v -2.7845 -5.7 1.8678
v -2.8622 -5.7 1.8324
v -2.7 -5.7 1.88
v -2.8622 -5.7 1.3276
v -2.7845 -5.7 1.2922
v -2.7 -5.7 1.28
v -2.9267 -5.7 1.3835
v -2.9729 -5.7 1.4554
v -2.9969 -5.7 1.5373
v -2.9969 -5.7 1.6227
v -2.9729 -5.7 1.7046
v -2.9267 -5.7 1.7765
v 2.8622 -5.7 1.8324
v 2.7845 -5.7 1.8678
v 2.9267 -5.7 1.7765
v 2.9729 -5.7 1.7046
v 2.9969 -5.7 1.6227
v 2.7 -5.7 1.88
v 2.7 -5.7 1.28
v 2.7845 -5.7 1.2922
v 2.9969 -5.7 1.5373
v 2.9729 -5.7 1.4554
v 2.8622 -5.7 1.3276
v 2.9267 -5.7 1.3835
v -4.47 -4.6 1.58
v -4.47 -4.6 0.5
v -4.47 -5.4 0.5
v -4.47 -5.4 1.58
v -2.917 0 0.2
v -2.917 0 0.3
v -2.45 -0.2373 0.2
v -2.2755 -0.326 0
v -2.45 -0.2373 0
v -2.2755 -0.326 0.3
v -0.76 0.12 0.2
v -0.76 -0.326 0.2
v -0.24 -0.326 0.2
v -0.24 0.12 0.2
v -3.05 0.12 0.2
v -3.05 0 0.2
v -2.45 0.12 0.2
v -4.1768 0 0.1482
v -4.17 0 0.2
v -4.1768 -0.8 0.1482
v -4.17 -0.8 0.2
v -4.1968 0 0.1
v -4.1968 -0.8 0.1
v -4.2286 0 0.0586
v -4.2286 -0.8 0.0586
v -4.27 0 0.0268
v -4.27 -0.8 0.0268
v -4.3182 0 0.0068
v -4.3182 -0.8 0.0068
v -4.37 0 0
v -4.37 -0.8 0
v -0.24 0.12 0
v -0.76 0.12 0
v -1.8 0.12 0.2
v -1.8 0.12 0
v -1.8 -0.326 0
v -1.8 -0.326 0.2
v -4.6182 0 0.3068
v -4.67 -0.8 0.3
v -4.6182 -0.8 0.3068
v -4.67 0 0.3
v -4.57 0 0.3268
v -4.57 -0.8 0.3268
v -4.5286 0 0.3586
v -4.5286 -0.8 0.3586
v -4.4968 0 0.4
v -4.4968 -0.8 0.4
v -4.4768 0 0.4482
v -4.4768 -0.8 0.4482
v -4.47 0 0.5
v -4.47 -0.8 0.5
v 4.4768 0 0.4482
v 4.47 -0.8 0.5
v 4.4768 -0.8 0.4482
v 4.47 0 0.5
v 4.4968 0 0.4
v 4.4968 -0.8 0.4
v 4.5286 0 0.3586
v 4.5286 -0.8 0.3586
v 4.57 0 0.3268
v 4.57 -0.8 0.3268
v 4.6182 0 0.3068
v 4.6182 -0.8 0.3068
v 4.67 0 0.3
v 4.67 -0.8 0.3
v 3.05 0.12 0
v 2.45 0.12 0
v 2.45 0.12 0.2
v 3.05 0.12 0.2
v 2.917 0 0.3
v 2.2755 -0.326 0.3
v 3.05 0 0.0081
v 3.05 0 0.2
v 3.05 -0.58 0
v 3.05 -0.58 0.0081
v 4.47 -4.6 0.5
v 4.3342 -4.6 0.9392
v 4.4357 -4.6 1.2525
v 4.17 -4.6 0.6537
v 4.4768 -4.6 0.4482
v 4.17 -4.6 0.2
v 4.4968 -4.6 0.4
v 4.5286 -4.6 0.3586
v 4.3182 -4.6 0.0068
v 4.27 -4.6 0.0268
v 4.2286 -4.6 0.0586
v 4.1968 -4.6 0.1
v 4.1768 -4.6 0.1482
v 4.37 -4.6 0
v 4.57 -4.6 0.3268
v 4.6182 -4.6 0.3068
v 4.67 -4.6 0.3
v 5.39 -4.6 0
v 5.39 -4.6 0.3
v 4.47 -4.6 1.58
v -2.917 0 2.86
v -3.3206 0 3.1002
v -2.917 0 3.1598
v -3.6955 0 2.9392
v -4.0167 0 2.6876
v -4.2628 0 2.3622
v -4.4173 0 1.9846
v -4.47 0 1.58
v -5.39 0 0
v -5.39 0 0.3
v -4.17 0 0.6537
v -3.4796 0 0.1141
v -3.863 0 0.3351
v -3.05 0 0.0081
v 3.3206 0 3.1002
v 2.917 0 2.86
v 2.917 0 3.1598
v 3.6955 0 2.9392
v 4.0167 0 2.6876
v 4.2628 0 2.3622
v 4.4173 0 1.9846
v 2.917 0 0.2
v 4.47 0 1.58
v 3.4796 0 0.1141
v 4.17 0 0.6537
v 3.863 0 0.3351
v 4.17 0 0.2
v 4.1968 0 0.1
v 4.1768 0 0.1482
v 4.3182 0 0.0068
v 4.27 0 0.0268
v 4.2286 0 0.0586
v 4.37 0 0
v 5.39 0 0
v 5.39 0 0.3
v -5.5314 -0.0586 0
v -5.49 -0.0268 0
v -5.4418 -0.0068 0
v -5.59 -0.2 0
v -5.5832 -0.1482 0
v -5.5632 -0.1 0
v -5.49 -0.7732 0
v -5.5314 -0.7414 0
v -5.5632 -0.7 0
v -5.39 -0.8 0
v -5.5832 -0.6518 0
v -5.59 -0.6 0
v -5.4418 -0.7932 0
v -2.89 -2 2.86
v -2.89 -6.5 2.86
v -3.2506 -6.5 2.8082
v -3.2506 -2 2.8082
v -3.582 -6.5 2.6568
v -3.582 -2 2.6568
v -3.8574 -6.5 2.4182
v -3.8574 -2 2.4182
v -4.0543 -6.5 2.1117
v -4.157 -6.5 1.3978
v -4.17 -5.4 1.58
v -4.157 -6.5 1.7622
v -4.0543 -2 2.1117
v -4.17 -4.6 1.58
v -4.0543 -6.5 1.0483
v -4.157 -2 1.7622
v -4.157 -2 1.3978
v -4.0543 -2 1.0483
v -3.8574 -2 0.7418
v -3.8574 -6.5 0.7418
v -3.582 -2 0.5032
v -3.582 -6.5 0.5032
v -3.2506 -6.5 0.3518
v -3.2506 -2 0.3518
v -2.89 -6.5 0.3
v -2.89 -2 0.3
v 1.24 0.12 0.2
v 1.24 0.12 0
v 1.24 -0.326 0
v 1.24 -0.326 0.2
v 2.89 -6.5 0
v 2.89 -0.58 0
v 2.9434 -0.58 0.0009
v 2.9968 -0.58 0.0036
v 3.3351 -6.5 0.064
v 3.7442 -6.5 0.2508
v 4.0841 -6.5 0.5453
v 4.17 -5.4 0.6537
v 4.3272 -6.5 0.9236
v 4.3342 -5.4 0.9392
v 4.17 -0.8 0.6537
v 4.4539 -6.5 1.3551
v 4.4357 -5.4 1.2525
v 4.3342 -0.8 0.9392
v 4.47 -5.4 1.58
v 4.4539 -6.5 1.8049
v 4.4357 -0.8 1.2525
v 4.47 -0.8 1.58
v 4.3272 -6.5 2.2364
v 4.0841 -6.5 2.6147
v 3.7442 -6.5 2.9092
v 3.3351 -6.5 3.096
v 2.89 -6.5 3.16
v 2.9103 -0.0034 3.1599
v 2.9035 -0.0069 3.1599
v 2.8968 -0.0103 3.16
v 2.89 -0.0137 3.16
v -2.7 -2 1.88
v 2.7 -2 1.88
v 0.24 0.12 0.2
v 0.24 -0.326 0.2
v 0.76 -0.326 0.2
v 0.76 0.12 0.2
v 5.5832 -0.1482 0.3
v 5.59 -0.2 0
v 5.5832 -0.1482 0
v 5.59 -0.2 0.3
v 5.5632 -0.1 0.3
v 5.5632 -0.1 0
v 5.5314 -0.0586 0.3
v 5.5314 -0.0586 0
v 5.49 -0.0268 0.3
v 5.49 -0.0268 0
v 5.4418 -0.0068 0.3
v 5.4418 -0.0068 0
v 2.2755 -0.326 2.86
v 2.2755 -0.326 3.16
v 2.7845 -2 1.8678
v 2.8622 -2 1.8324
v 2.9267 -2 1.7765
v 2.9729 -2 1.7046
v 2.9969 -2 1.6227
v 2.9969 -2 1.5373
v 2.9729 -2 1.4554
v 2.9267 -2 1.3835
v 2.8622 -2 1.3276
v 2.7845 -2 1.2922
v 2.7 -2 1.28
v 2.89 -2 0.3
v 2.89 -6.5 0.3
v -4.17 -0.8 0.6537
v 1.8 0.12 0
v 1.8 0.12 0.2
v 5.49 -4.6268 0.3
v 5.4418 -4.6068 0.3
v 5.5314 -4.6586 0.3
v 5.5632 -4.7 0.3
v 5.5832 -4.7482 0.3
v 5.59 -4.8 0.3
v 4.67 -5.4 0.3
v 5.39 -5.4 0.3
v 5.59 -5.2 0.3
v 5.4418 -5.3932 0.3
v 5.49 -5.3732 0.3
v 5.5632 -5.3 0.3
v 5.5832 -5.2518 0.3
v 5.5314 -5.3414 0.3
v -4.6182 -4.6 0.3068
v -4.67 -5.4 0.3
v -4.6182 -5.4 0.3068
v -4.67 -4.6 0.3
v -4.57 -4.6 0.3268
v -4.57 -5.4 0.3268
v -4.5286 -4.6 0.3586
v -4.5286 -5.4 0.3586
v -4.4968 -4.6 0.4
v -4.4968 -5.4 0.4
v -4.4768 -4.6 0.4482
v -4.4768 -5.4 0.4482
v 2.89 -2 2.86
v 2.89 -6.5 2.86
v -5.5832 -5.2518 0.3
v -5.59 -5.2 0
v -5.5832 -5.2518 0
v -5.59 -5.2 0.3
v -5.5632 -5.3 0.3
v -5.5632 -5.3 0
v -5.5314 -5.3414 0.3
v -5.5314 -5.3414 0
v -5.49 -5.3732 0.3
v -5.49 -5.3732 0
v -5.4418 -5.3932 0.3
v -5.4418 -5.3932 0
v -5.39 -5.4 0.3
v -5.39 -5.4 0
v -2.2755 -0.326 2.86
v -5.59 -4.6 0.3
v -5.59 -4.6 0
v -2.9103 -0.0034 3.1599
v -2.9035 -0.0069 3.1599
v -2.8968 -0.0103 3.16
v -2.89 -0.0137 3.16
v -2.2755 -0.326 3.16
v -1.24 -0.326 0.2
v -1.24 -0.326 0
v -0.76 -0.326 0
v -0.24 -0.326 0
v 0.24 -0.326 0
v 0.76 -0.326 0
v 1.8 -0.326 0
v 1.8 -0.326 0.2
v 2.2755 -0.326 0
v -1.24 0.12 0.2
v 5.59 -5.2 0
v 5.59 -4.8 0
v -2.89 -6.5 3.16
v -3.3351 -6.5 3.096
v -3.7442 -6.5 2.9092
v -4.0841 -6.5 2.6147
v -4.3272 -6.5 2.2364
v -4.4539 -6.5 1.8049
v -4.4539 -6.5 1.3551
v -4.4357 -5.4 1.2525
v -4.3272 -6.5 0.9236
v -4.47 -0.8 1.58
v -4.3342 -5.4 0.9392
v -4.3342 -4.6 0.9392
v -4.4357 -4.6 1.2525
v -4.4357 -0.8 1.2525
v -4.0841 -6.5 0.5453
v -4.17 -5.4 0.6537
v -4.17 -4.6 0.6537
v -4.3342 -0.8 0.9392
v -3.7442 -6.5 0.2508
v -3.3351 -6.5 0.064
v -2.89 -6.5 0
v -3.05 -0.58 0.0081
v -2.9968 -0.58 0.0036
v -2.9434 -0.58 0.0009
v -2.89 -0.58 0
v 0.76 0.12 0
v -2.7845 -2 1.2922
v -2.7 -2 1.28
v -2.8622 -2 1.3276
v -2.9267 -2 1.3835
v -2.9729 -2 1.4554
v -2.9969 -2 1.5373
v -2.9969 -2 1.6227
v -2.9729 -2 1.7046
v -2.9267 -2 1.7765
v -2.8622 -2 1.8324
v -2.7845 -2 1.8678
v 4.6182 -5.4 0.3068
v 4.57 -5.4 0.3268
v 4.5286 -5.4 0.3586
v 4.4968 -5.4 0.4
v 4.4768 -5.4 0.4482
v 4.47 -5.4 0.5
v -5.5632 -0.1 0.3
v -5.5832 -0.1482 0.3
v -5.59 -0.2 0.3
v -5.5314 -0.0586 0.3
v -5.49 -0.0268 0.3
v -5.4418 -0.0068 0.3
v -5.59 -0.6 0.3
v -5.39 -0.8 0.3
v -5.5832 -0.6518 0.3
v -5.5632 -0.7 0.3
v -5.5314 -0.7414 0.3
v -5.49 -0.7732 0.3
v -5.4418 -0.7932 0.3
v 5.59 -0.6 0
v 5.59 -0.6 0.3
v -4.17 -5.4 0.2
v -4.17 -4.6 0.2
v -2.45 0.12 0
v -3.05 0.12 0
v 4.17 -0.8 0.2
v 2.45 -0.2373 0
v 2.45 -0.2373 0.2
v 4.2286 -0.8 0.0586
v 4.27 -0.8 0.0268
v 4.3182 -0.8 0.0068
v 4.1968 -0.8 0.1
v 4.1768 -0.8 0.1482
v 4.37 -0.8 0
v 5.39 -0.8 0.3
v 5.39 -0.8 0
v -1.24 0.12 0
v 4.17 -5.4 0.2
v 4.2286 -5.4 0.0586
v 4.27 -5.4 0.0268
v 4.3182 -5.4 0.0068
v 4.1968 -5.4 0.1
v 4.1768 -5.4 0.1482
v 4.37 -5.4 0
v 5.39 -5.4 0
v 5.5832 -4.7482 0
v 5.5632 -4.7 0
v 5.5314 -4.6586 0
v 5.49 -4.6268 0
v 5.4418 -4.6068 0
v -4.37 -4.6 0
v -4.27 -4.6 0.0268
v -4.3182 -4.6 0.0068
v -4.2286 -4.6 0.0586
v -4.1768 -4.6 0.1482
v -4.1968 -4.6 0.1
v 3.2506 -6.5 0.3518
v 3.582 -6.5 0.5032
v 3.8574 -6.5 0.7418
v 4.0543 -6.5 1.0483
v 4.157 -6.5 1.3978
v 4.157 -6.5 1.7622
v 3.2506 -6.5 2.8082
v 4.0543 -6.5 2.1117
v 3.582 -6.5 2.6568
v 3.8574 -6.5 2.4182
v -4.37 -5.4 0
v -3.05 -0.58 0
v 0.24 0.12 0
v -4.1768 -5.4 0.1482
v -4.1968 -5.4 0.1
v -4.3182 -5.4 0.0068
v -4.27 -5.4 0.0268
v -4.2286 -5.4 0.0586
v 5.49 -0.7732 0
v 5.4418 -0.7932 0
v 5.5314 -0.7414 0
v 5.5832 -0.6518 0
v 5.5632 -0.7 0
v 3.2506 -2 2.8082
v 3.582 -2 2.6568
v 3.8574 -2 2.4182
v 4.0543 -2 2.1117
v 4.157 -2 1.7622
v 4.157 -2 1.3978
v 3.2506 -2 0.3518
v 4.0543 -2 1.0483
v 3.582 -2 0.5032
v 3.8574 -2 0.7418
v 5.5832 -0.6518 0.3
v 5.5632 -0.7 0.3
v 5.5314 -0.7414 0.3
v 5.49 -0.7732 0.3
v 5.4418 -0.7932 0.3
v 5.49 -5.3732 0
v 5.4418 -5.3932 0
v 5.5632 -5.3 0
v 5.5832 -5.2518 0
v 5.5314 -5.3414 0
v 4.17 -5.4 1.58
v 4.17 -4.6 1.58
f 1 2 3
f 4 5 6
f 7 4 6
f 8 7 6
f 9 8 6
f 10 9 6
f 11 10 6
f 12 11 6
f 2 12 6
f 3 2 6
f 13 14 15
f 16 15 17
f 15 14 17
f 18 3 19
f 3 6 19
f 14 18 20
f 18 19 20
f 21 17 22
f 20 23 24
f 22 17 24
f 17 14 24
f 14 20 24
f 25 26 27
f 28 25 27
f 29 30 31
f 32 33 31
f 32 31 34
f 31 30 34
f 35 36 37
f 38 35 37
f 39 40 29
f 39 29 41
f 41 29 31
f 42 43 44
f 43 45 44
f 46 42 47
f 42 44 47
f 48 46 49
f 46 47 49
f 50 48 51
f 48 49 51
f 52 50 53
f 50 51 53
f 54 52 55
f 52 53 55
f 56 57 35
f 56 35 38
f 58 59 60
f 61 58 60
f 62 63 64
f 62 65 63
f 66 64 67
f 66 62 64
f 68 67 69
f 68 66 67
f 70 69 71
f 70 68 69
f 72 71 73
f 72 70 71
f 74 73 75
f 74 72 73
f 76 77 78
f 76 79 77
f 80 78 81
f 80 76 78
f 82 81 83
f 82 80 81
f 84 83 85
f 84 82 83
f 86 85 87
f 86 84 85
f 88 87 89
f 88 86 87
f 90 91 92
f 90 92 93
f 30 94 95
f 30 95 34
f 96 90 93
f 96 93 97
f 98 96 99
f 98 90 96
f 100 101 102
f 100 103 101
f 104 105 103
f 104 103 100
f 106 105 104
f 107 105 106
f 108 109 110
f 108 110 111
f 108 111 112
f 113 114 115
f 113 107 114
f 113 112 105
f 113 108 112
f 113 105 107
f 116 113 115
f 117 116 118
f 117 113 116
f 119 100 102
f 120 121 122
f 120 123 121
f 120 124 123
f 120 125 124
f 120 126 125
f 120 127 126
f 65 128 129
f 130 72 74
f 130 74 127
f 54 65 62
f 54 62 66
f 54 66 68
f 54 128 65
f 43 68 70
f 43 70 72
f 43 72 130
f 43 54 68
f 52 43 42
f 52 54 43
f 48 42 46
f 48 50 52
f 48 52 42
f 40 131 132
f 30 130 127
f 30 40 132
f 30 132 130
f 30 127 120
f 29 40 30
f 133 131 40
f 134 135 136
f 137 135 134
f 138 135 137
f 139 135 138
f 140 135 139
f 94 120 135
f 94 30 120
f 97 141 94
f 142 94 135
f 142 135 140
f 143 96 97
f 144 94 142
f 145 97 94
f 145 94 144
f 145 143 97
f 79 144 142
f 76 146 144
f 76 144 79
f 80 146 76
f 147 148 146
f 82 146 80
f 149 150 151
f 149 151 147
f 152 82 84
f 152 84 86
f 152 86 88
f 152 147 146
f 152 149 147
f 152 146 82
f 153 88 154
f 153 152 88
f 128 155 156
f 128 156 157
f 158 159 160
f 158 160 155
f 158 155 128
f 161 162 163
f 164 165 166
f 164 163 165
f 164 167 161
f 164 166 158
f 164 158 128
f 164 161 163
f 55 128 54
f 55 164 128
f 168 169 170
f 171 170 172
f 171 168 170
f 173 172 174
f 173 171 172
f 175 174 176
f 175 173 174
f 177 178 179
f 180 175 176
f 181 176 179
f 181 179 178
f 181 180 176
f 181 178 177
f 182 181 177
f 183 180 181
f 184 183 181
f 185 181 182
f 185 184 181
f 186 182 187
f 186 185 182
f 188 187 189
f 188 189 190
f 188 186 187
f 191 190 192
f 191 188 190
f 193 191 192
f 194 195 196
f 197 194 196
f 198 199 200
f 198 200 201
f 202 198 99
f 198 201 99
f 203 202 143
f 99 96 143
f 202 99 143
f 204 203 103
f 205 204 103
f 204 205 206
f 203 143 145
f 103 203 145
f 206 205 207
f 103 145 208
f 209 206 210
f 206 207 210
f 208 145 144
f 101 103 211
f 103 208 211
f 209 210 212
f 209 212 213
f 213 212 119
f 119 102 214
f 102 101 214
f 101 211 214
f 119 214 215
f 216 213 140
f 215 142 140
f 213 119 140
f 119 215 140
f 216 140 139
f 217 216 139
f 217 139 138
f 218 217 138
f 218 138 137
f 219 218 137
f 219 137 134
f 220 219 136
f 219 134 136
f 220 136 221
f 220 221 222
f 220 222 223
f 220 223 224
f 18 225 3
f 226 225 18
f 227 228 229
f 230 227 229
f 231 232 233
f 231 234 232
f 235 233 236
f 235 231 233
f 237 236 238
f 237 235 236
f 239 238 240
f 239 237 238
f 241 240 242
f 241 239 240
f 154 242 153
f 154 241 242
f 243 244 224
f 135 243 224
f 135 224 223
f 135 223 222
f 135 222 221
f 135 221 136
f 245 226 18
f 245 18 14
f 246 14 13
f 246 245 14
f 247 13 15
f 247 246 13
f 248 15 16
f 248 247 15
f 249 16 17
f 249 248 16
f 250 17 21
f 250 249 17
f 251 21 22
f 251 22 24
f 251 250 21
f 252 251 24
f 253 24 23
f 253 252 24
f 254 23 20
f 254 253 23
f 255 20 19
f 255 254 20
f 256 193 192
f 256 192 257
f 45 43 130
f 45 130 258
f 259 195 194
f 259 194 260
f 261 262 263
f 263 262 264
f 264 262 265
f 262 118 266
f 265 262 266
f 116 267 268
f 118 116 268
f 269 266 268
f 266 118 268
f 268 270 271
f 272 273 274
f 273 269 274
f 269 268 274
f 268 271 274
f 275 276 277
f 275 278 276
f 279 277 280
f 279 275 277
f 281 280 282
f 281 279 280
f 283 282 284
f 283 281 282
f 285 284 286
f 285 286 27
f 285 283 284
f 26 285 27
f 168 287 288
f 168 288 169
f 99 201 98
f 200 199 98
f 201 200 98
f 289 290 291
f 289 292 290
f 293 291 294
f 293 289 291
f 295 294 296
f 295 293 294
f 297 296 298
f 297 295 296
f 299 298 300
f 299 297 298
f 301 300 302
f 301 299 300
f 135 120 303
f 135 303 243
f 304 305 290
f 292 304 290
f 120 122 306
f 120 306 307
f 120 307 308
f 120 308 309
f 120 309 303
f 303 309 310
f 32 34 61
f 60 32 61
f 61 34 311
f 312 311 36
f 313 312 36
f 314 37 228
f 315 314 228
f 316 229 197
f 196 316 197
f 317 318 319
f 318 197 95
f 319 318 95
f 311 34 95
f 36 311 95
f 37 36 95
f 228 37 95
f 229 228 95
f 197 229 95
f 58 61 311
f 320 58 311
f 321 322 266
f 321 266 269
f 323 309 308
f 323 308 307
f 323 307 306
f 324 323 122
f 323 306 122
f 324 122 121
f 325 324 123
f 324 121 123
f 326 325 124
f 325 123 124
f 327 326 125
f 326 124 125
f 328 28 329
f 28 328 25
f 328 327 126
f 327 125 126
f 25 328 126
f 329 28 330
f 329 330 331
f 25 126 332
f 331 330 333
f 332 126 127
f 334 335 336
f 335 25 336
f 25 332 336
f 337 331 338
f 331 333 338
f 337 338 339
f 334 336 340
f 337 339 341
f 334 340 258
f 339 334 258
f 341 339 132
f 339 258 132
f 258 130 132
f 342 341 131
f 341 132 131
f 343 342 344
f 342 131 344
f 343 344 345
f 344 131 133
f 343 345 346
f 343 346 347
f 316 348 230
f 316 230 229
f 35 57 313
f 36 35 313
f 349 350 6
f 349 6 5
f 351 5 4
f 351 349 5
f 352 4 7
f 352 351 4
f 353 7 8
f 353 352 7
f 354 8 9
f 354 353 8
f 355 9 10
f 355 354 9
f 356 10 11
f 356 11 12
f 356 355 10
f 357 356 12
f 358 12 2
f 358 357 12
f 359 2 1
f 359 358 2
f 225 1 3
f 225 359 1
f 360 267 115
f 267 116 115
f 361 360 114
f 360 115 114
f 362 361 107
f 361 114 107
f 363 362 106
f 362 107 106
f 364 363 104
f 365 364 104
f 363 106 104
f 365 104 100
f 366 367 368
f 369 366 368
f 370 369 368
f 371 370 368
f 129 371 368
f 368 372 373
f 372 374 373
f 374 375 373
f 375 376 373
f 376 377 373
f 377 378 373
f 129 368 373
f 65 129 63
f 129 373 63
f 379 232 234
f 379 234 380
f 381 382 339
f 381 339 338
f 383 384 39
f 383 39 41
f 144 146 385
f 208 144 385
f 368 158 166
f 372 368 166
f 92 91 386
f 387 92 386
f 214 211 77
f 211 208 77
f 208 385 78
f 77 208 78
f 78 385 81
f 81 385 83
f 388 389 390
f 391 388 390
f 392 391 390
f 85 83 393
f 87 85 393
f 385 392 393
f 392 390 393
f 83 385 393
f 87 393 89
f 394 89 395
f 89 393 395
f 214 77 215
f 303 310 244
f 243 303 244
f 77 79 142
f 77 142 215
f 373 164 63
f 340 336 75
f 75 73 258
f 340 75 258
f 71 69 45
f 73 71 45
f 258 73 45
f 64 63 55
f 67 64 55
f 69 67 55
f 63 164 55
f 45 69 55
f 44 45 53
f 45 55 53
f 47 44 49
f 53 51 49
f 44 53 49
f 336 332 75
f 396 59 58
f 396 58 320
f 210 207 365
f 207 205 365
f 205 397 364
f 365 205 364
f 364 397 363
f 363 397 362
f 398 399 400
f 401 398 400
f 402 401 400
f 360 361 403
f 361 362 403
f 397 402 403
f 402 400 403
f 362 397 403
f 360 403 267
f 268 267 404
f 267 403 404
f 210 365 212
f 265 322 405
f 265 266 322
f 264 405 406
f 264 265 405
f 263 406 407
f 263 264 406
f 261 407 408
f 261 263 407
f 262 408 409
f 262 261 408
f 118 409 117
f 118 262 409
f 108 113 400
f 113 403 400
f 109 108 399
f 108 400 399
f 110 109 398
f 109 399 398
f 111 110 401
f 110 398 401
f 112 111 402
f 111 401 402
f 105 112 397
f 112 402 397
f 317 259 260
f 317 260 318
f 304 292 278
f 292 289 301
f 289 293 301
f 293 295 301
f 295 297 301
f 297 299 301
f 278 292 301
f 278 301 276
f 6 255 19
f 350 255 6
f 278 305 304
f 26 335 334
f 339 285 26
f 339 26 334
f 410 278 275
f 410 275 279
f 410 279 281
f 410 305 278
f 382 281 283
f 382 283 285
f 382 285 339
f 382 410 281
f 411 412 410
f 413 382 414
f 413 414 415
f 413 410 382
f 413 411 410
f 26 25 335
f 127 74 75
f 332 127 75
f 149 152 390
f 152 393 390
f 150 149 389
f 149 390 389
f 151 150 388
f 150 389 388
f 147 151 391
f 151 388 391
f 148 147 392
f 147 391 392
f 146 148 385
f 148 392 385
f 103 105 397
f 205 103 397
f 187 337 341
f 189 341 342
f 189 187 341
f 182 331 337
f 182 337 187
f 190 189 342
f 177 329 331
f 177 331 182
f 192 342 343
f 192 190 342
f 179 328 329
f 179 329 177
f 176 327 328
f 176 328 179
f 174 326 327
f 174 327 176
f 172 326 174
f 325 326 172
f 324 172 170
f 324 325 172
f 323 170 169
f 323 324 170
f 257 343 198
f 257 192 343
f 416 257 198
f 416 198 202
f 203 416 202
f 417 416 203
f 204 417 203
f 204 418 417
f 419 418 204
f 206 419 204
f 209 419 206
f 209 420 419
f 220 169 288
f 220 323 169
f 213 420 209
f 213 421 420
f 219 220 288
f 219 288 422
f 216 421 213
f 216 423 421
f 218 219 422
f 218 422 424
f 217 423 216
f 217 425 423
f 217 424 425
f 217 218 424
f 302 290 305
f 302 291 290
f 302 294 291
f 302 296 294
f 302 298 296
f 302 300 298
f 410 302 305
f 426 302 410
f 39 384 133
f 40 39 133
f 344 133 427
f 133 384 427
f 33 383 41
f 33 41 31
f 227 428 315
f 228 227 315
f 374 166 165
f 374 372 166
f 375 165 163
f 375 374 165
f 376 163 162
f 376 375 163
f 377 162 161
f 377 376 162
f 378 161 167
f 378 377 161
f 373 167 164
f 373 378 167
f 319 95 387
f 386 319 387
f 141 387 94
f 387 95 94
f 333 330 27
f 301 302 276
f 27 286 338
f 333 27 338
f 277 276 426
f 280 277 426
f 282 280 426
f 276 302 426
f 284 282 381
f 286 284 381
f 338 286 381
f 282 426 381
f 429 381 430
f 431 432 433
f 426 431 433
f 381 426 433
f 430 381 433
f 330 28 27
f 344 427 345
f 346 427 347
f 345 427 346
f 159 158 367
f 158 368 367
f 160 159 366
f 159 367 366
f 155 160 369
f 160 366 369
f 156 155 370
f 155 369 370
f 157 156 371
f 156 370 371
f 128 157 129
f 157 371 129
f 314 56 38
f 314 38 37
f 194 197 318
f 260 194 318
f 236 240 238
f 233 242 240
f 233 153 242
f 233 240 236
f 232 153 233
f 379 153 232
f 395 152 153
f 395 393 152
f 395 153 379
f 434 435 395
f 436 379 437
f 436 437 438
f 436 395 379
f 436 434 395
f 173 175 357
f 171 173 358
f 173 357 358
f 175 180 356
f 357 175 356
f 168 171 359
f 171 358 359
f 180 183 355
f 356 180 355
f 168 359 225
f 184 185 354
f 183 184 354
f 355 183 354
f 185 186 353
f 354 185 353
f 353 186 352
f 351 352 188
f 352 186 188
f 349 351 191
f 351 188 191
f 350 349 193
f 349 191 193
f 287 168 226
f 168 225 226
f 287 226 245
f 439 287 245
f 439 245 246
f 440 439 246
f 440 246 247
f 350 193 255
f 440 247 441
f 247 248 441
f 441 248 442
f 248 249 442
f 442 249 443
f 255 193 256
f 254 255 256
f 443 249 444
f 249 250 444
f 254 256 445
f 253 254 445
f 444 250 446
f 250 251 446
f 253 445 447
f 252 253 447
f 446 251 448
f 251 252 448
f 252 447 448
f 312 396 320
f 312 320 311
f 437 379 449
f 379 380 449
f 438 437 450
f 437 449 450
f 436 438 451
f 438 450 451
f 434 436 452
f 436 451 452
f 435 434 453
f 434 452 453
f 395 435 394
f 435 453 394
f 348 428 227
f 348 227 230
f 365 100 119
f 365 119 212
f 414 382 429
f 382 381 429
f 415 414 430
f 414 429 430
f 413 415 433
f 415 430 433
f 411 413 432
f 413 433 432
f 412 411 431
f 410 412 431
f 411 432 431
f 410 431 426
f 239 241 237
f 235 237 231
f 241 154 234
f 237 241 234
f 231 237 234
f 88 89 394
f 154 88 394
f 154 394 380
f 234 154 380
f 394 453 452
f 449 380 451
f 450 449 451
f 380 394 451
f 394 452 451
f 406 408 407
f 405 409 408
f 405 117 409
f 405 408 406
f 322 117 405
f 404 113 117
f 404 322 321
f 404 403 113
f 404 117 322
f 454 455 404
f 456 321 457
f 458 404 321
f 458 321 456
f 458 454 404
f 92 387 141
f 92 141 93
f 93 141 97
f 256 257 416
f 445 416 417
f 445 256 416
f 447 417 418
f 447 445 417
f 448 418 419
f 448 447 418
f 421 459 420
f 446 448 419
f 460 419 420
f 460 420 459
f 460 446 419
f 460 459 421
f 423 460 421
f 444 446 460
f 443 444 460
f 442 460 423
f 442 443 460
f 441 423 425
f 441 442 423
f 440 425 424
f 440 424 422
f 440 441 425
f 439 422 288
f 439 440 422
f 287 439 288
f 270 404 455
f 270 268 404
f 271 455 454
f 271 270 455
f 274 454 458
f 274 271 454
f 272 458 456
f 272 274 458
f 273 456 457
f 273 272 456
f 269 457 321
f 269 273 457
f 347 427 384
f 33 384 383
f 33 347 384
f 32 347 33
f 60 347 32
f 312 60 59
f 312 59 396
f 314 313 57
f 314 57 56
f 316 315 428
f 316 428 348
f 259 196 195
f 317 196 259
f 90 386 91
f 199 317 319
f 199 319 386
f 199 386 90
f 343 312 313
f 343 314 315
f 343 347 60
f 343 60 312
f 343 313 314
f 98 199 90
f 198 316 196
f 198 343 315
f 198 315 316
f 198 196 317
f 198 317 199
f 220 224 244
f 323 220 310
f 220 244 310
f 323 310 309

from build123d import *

# Parameters (mm, degrees)
PAD_DEPTH     = 6.5
POCKET_DEPTH  = 3.161
SKETCH002_W   = 0.3
SKETCH002_H   = 0.8
PAD001_DEPTH  = 1.58
SKETCH007_W   = 0.6
SKETCH007_H   = 0.7
SKETCH007_W_2 = 0.56
SKETCH007_W_3 = 0.52
PAD002_DEPTH  = 0.2
PAD003_DEPTH  = 2
PAD004_DEPTH  = 5.7
SKETCH008_W   = 1.42
SKETCH008_H   = 0.8
PAD005_DEPTH  = 0.3
FILLET_R      = 0.2


with BuildPart() as part:
    # Sketch → Pad (new body)
    with BuildSketch(Plane.XZ):
        with BuildLine():
            ThreePointArc((-2.89, 3.16), (-4.47, 1.58), (-2.89, 0))
            Line((-2.89, 0), (2.89, 0))
            ThreePointArc((2.89, 0), (4.47, 1.58), (2.89, 3.16))
            Line((2.89, 3.16), (-2.89, 3.16))
        make_face()
        with BuildLine():
            ThreePointArc((-2.89, 2.86), (-4.17, 1.58), (-2.89, 0.3))
            Line((-2.89, 0.3), (2.89, 0.3))
            ThreePointArc((2.89, 0.3), (4.17, 1.58), (2.89, 2.86))
            Line((2.89, 2.86), (-2.89, 2.86))
        make_face(mode=Mode.SUBTRACT)
    extrude(amount=PAD_DEPTH)

    # Sketch001 (on DatumPlane) → Pocket (cut, through all)
    with BuildSketch(Plane(origin=(0, 0, 3.16), x_dir=(-1, 0, 0), z_dir=(0, 0, 1))):
        Polygon((-2.917, 0), (2.917, 0), (2.275486, 0.326), (-2.275486, 0.326), align=None)
    extrude(amount=-POCKET_DEPTH, mode=Mode.SUBTRACT)

    # Sketch002 (on DatumPlane) → Pad001 (join)
    with BuildSketch(Plane(origin=(0, 0, 0), x_dir=(1, 0, 0), z_dir=(0, 0, -1))):
        with Locations((-4.32, 5)):
            Rectangle(SKETCH002_W, SKETCH002_H)
        with Locations((4.32, 5)):
            Rectangle(SKETCH002_W, SKETCH002_H)
        with Locations((-4.32, 0.4)):
            Rectangle(SKETCH002_W, SKETCH002_H)
        with Locations((4.32, 0.4)):
            Rectangle(SKETCH002_W, SKETCH002_H)
    extrude(amount=-PAD001_DEPTH)

    # Sketch007 → Pad002 (join)
    with BuildSketch(Plane(origin=(0, 0, 0), x_dir=(1, 0, 0), z_dir=(0, 0, -1))):
        with Locations((-2.75, 0.23)):
            Rectangle(SKETCH007_W, SKETCH007_H)
        with Locations((-1.52, 0.23)):
            Rectangle(SKETCH007_W_2, SKETCH007_H)
        with Locations((-0.5, 0.23)):
            Rectangle(SKETCH007_W_3, SKETCH007_H)
        with Locations((2.75, 0.23)):
            Rectangle(SKETCH007_W, SKETCH007_H)
        with Locations((1.52, 0.23)):
            Rectangle(SKETCH007_W_2, SKETCH007_H)
        with Locations((0.5, 0.23)):
            Rectangle(SKETCH007_W_3, SKETCH007_H)
    extrude(amount=-PAD002_DEPTH)

    # Sketch005 (on DatumPlane) → Pad003 (join)
    with BuildSketch(Plane(origin=(0, 0, 0), x_dir=(1, 0, 0), z_dir=(0, 1, 0))):
        with BuildLine():
            ThreePointArc((-2.95, -0.3), (-4.23, -1.58), (-2.95, -2.86))
            Line((-2.95, -2.86), (2.95, -2.86))
            ThreePointArc((2.95, -2.86), (4.23, -1.58), (2.95, -0.3))
            Line((2.95, -0.3), (-2.95, -0.3))
        make_face()
    extrude(amount=-PAD003_DEPTH)

    # Sketch006 (on DatumPlane) → Pad004 (join)
    with BuildSketch(Plane(origin=(0, 0, 0), x_dir=(1, 0, 0), z_dir=(0, 1, 0))):
        with BuildLine():
            ThreePointArc((-2.7, -1.28), (-3, -1.58), (-2.7, -1.88))
            Line((-2.7, -1.88), (2.7, -1.88))
            ThreePointArc((2.7, -1.88), (3, -1.58), (2.7, -1.28))
            Line((2.7, -1.28), (-2.7, -1.28))
        make_face()
    extrude(amount=-PAD004_DEPTH)

    # Sketch008 (on DatumPlane) → Pad005 (join)
    with BuildSketch(Plane(origin=(0, 0, 0), x_dir=(1, 0, 0), z_dir=(0, 0, -1))):
        with Locations((-4.88, 5)):
            Rectangle(SKETCH008_W, SKETCH008_H)
        with Locations((-4.88, 0.4)):
            Rectangle(SKETCH008_W, SKETCH008_H)
        with Locations((4.88, 0.4)):
            Rectangle(SKETCH008_W, SKETCH008_H)
        with Locations((4.88, 5)):
            Rectangle(SKETCH008_W, SKETCH008_H)
    extrude(amount=-PAD005_DEPTH)

    # Fillet
    fillet_edges = [part.edges().sort_by_distance(p)[0] for p in [
        (4.47, -0.4, 0.3),
        (4.47, -5, 0.3),
        (4.17, -0.4, 0),
        (4.17, -5, 0),
        (-4.17, -0.4, 0),
        (-4.17, -5, 0),
        (-4.47, -0.4, 0.3),
        (-4.47, -5, 0.3),
        (-5.59, 0, 0.15),
        (-5.59, -5.4, 0.15),
        (-5.59, -0.8, 0.15),
        (5.59, -5.4, 0.15),
        (5.59, -4.6, 0.15),
        (5.59, 0, 0.15),
        (5.59, -0.8, 0.15),
    ]]
    fillet(fillet_edges, radius=FILLET_R)


solid = part.part
